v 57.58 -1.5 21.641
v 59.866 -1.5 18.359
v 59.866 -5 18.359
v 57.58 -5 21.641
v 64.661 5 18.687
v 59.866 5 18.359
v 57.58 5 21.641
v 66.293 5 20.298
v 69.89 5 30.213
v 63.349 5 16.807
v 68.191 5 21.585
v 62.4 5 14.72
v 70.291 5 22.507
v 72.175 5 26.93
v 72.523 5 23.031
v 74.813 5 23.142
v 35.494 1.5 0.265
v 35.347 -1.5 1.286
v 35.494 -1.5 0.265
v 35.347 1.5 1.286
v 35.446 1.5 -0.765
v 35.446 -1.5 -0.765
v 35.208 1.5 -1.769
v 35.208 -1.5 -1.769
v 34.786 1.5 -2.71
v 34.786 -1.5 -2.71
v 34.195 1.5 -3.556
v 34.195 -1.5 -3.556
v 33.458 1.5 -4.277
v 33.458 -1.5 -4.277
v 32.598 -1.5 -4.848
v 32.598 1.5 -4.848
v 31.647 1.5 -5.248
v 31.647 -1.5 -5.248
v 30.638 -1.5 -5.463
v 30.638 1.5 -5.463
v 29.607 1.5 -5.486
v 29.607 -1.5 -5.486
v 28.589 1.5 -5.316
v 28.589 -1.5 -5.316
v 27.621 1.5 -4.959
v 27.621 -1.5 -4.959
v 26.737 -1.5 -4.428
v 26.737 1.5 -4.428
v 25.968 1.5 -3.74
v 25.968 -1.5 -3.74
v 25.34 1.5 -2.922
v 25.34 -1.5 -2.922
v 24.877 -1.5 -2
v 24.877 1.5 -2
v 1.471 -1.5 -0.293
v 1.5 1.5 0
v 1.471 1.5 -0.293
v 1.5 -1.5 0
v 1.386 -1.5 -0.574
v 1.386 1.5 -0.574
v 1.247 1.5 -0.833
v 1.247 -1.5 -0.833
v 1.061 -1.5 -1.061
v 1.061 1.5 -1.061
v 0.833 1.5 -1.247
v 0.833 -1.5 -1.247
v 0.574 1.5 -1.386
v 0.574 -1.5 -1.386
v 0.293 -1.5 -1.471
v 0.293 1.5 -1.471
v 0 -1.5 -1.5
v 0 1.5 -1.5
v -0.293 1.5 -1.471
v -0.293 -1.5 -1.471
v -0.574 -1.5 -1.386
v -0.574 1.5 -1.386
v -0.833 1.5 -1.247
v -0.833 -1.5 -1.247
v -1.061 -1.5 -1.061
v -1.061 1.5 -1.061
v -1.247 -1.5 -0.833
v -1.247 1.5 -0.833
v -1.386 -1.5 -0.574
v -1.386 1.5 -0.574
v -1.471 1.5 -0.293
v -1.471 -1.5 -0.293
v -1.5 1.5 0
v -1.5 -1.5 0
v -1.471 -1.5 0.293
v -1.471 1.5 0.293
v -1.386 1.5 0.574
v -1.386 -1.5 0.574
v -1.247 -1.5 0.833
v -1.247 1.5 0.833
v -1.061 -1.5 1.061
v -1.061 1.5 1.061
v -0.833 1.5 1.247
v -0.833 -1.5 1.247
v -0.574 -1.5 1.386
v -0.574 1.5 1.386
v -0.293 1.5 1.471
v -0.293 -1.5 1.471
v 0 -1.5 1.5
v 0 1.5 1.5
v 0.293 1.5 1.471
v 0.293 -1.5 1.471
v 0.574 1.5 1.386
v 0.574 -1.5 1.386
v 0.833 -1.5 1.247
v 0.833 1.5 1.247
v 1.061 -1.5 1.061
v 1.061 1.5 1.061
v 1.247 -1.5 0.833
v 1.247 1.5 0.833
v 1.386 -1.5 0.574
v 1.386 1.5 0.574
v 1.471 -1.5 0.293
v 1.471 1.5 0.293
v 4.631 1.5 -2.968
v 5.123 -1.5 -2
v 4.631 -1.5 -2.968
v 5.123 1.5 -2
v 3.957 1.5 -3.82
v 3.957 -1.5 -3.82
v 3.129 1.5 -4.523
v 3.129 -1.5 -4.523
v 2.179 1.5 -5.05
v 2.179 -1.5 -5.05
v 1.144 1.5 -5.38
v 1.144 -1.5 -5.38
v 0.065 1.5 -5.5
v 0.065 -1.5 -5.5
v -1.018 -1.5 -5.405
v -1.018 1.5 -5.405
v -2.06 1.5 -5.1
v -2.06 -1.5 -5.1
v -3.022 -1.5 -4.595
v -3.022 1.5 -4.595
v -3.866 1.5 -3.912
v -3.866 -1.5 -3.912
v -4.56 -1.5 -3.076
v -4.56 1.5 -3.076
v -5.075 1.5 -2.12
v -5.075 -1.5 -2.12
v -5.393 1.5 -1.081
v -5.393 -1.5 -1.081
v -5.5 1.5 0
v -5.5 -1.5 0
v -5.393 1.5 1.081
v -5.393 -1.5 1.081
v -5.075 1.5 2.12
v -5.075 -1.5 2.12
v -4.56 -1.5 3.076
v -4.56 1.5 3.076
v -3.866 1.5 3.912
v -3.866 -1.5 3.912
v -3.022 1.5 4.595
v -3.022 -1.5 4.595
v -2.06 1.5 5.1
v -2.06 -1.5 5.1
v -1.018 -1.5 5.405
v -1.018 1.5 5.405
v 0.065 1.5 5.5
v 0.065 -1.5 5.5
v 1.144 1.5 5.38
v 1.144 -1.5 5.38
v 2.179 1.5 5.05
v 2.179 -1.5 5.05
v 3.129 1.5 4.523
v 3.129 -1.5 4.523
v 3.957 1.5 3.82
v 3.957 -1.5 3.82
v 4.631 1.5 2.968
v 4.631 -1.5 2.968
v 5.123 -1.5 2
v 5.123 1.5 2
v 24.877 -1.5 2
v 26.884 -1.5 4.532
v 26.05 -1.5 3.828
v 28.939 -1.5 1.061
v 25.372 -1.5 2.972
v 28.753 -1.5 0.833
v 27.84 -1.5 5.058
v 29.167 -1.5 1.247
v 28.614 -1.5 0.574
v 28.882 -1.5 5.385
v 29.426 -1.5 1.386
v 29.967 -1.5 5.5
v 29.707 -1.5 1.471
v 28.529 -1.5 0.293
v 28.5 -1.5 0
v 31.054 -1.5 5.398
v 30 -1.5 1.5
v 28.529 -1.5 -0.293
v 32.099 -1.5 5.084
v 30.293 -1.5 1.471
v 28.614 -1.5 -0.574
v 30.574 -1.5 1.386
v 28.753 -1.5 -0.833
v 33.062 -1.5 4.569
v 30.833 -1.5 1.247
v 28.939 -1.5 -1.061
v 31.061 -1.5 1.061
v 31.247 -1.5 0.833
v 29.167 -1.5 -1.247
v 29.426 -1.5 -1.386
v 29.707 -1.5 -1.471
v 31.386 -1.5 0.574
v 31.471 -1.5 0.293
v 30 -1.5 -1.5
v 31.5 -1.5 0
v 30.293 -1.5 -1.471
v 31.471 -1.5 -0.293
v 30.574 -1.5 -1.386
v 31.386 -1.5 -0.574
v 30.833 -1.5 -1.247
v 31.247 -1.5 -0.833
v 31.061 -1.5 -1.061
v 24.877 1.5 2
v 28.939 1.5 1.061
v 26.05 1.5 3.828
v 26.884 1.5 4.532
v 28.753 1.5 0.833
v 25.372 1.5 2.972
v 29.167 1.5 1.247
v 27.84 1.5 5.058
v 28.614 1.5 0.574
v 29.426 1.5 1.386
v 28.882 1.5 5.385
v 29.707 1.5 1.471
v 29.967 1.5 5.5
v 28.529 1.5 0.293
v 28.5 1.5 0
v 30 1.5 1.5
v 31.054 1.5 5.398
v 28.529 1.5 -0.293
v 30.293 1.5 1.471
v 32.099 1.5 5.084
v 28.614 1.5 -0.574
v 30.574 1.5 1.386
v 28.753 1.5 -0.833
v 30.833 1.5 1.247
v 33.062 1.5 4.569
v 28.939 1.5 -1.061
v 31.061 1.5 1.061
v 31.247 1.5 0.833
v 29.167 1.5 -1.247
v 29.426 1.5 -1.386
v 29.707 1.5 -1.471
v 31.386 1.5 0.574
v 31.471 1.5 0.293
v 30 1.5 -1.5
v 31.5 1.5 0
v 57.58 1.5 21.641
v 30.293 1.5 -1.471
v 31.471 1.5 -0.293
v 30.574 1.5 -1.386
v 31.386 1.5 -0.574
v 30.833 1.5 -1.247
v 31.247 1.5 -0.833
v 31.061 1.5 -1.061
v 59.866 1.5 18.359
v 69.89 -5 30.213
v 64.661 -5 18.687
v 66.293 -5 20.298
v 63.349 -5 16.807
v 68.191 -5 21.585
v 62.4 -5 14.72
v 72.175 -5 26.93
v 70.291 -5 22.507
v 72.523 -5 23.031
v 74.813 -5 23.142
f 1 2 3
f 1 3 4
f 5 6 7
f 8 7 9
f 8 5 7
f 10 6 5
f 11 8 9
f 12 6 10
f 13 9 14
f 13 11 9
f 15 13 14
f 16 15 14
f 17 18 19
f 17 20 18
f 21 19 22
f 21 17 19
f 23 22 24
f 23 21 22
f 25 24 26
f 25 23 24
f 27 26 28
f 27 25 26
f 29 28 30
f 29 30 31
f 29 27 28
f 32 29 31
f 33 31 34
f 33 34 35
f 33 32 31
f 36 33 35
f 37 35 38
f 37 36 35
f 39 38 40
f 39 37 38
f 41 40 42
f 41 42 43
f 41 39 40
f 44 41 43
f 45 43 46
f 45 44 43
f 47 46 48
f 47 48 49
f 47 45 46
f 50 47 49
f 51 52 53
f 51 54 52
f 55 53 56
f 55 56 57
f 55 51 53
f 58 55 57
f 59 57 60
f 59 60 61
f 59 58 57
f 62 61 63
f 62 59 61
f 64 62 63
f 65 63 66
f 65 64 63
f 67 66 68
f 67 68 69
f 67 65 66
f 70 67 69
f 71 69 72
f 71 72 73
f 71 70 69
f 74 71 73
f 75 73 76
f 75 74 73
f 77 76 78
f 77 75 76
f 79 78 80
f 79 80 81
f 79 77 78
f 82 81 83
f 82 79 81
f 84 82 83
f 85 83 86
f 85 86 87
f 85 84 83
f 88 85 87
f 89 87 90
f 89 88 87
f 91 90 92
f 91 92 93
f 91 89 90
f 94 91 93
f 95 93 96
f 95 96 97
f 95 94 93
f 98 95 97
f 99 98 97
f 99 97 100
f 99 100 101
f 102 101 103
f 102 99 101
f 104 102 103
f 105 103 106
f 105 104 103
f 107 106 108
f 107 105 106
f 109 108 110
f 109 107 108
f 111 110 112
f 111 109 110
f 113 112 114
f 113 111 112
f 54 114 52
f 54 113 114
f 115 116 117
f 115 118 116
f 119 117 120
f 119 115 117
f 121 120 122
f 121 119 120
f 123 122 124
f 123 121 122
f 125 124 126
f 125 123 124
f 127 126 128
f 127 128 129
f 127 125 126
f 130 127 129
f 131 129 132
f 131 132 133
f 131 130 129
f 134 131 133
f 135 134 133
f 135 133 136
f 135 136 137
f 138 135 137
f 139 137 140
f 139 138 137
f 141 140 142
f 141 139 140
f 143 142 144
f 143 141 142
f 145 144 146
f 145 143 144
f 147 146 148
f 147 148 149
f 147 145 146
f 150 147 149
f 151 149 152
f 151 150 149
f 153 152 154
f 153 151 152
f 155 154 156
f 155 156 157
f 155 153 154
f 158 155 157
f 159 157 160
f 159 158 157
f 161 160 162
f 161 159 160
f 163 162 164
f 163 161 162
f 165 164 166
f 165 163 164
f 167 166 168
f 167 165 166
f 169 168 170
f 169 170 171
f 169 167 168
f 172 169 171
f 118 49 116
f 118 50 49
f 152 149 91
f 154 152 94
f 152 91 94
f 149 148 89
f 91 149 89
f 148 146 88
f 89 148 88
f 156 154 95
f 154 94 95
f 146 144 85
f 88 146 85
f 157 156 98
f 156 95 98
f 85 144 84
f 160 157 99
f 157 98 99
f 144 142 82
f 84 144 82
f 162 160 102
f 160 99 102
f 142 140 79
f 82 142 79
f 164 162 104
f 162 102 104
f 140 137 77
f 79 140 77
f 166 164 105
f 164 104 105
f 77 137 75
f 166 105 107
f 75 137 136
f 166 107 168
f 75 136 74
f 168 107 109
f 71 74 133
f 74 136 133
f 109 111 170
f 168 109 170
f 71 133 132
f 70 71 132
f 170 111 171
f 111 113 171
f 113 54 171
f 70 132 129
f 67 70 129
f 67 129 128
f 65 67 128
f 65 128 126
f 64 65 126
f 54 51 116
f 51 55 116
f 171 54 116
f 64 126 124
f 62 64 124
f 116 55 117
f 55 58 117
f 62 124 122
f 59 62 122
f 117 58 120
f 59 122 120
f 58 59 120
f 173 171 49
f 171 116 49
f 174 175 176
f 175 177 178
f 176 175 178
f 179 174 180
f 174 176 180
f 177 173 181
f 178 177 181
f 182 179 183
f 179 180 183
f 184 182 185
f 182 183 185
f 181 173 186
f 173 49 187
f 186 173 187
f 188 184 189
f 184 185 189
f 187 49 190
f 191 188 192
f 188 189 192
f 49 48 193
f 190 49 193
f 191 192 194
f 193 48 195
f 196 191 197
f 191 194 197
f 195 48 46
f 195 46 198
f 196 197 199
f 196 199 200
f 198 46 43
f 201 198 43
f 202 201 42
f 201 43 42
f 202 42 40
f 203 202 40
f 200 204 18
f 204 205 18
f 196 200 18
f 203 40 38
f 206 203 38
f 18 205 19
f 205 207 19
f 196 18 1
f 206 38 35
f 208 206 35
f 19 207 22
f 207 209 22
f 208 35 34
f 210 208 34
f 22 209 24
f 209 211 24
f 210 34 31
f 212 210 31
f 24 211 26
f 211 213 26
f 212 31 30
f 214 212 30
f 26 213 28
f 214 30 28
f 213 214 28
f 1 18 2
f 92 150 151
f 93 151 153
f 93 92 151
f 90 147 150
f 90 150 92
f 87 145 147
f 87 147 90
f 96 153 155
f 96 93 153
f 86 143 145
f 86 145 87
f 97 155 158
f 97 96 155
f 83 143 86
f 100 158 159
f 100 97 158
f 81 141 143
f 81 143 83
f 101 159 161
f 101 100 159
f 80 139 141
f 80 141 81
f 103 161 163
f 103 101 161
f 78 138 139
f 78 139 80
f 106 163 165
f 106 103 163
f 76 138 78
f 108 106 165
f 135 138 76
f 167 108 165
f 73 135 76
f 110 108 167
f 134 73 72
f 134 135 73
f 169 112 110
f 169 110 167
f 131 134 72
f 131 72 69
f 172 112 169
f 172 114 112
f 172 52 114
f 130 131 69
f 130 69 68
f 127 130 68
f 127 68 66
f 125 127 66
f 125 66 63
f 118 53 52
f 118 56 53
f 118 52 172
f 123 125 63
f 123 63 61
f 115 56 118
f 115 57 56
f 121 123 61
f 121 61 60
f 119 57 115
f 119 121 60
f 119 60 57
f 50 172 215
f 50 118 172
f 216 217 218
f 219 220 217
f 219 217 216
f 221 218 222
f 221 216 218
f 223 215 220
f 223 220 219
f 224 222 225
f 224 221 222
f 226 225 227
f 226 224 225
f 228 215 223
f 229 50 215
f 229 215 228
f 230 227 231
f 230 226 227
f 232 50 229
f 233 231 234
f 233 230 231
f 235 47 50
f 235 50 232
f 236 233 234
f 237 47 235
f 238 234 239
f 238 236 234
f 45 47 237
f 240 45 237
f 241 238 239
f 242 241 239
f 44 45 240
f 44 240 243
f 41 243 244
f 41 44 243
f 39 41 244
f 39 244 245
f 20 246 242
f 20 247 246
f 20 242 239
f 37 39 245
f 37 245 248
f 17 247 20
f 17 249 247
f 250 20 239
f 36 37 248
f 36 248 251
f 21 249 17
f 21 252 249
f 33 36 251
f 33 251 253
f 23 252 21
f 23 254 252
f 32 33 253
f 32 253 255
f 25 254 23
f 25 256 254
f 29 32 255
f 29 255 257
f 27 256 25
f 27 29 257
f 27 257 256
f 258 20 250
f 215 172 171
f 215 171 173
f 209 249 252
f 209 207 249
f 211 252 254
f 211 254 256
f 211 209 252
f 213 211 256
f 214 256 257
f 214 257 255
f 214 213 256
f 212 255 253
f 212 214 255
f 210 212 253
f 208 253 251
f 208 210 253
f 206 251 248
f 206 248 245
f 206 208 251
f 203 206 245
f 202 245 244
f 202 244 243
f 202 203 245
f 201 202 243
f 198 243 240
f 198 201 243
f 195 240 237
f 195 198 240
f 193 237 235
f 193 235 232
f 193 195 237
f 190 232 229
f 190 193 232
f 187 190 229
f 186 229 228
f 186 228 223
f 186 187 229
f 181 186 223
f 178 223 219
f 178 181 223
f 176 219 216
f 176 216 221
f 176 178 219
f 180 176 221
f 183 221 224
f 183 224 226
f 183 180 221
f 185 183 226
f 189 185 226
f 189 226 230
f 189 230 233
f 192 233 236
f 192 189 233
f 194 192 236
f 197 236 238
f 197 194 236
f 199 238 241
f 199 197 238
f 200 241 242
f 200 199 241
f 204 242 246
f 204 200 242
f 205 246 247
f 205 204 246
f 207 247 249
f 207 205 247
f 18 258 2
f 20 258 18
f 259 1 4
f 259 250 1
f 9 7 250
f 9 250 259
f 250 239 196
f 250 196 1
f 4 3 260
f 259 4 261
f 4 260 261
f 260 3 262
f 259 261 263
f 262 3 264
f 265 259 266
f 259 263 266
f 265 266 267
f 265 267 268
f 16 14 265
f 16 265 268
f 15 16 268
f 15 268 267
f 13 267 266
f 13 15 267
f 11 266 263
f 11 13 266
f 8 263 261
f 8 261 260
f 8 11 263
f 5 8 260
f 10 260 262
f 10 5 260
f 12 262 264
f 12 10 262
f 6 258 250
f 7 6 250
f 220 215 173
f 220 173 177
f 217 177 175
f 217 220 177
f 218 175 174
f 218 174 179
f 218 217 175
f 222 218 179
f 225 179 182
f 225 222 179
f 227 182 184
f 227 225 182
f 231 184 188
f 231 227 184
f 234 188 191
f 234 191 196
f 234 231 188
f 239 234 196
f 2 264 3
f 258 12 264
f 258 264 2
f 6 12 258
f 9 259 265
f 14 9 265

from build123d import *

# Parameters (mm, degrees)
SKETCH1_R                = 1.5
BOSS_EXTRUDE1_DEPTH      = 1.5
BOSS_EXTRUDE1_DEPTH_BACK = 1.5
BOSS_EXTRUDE2_DEPTH      = 5
BOSS_EXTRUDE2_DEPTH_BACK = 5


with BuildPart() as part:
    # Sketch1 → Boss-Extrude1 (new body, two sides)
    with BuildSketch(Plane(origin=(0, 0, 0), x_dir=(1, 0, 0), z_dir=(0, 1, 0))) as boss_extrude1_sk:
        with BuildLine():
            ThreePointArc((5.123475383, 2), (-5.5, 0), (5.123475383, -2))
            Line((5.123475383, -2), (24.876524617, -2))
            ThreePointArc((24.876524617, -2), (28.352990157, -5.247605032), (33.061732187, -4.569003832))
            Line((33.061732187, -4.569003832), (57.57995609, -21.641303613))
            Line((57.57995609, -21.641303613), (59.865670376, -18.358696387))
            Line((59.865670376, -18.358696387), (35.347446472, -1.286396606))
            ThreePointArc((35.347446472, -1.286396606), (31.647009843, 5.247605032), (24.876524617, 2))
            Line((24.876524617, 2), (5.123475383, 2))
        make_face()
        Circle(SKETCH1_R, mode=Mode.SUBTRACT)
        with Locations((30, 0)):
            Circle(SKETCH1_R, mode=Mode.SUBTRACT)
    extrude(amount=BOSS_EXTRUDE1_DEPTH)
    extrude(boss_extrude1_sk.sketch, amount=-BOSS_EXTRUDE1_DEPTH_BACK)

    # Sketch2 → Boss-Extrude2 (add, two sides)
    with BuildSketch(Plane(origin=(0, 0, 0), x_dir=(1, 0, 0), z_dir=(0, 1, 0))) as boss_extrude2_sk:
        Polygon((59.865670376, -18.358696387), (57.57995609, -21.641303613), (69.88973319, -30.212732185), (72.175447475, -26.930124958), align=None)
        with BuildLine():
            Line((62.399646215, -14.719550648), (59.865670376, -18.358696387))
            Line((59.865670376, -18.358696387), (72.175447475, -26.930124958))
            Line((72.175447475, -26.930124958), (74.81330558, -23.141789675))
            ThreePointArc((74.81330558, -23.141789675), (67.212824585, -20.984792896), (62.399646215, -14.719550648))
        make_face()
    extrude(amount=BOSS_EXTRUDE2_DEPTH)
    extrude(boss_extrude2_sk.sketch, amount=-BOSS_EXTRUDE2_DEPTH_BACK)


solid = part.part
